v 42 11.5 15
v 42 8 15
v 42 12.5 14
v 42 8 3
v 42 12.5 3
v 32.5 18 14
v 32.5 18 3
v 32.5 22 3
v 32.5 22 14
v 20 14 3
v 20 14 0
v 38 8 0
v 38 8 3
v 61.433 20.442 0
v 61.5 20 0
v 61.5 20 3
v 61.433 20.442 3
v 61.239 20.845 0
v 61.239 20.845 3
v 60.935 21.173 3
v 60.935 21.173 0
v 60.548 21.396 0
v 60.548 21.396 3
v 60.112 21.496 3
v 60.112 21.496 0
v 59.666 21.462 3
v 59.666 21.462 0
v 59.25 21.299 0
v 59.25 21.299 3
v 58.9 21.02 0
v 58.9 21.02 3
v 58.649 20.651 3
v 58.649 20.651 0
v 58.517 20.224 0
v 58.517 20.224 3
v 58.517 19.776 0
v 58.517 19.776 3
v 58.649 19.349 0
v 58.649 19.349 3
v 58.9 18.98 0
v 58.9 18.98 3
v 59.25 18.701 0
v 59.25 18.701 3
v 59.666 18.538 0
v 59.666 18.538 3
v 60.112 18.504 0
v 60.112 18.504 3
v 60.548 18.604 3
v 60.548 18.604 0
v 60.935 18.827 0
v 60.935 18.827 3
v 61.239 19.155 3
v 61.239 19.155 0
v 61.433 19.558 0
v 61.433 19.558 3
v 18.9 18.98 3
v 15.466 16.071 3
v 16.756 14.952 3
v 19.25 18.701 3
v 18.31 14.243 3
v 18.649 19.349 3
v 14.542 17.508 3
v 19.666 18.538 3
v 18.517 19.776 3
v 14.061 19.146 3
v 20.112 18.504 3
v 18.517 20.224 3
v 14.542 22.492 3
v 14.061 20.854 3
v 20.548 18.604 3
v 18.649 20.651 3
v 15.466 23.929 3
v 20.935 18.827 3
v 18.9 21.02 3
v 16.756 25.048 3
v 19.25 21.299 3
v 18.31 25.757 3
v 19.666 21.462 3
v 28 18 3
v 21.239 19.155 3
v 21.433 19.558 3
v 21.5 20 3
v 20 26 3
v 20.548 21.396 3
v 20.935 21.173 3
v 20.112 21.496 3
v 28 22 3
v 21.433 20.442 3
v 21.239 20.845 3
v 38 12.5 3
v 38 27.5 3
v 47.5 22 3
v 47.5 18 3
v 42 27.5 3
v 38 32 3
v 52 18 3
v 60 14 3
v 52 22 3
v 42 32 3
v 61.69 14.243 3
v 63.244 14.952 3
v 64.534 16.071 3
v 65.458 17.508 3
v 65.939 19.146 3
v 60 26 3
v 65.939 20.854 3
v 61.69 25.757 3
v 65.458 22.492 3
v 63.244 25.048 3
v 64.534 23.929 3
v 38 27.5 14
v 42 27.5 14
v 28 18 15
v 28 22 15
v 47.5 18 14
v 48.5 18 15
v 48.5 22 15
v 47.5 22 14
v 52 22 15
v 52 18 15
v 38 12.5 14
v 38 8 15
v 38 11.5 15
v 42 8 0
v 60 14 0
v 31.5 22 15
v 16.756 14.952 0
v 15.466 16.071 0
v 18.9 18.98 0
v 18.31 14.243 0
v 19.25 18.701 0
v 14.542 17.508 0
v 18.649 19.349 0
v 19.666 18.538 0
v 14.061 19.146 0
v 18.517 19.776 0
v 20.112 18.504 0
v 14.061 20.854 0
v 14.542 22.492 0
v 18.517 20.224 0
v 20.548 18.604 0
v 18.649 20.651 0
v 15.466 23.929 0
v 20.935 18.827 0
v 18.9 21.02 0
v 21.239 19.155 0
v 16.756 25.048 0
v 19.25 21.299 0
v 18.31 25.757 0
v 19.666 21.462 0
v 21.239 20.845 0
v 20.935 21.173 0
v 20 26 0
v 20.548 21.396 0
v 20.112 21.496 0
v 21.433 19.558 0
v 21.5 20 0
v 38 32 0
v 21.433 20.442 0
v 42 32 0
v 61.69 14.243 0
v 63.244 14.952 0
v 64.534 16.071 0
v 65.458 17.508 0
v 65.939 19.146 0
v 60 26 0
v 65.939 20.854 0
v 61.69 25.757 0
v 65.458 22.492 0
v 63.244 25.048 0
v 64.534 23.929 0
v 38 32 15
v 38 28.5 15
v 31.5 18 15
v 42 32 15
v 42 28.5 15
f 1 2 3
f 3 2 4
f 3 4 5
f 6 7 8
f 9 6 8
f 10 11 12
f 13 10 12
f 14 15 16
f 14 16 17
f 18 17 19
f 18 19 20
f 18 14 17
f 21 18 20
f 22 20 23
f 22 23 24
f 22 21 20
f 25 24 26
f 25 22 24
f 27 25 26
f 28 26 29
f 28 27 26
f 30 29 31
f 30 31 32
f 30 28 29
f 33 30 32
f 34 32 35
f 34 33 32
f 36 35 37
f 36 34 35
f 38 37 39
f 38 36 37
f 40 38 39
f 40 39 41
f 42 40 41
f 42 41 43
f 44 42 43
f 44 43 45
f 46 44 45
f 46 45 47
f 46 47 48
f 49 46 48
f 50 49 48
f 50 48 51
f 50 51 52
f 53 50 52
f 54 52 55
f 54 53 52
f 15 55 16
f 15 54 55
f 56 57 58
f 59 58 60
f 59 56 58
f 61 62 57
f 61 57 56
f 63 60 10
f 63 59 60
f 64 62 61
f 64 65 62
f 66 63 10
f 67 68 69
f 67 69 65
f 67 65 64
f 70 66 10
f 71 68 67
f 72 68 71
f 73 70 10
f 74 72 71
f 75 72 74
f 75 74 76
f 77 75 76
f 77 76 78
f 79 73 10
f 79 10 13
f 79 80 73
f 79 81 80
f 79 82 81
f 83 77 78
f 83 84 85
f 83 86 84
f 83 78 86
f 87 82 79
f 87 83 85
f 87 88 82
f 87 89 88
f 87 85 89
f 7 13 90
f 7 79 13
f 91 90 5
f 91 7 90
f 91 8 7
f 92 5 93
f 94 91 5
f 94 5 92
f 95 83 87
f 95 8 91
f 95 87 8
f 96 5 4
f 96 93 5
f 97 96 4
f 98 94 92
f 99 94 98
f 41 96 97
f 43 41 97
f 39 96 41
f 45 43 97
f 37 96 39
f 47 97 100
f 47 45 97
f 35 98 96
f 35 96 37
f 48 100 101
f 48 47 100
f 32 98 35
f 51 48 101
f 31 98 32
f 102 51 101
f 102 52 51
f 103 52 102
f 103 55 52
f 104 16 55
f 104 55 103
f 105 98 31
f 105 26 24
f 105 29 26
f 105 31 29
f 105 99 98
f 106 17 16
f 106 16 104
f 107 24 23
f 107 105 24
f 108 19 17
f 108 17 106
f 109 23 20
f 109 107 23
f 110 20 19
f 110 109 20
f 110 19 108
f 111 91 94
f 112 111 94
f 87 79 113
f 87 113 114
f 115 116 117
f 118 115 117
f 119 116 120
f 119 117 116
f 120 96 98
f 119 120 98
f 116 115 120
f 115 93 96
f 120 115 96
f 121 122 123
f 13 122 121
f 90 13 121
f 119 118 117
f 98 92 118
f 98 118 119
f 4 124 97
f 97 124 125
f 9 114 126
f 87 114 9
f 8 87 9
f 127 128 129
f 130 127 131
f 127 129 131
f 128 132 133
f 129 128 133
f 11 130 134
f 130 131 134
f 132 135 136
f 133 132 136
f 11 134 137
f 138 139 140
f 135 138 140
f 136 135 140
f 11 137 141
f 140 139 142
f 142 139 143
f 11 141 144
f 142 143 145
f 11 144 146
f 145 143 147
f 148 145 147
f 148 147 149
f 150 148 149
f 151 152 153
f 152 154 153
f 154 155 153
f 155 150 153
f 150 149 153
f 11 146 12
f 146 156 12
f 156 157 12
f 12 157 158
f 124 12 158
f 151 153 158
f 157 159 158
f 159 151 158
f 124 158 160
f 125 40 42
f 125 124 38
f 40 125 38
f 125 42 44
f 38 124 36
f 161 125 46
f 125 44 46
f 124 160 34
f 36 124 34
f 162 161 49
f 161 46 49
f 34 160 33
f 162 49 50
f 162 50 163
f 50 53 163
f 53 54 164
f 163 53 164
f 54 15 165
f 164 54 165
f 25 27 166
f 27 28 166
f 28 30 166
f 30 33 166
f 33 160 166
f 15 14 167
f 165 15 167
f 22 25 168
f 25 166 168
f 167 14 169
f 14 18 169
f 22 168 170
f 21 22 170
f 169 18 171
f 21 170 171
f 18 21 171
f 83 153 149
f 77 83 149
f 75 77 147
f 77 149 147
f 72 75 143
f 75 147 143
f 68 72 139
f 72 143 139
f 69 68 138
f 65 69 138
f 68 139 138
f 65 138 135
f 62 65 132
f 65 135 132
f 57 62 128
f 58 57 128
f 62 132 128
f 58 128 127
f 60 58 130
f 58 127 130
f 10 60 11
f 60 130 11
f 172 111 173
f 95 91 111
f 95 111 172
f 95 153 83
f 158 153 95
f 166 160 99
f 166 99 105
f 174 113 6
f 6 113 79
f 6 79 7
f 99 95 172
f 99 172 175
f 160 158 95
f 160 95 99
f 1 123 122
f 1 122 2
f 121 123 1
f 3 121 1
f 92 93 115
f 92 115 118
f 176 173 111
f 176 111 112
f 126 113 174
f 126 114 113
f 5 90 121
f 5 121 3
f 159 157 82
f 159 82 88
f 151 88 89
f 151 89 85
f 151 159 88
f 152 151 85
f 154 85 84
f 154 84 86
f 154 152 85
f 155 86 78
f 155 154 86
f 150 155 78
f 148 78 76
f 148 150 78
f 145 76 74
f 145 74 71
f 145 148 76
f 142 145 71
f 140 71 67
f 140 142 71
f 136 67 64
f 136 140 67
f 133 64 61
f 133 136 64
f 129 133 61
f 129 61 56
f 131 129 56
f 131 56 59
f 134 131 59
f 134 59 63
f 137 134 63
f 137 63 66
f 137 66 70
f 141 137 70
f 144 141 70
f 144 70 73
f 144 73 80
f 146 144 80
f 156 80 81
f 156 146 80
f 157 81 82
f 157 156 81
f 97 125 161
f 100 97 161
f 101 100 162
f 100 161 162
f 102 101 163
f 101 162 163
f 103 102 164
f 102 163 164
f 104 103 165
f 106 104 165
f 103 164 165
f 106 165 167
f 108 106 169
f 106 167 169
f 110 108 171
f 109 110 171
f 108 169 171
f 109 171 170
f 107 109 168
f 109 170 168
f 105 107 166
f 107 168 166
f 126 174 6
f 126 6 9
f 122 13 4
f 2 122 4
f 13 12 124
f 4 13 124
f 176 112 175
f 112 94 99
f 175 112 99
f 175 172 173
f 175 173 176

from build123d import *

# Parameters (mm, degrees)
SKETCH_R      = 1.5
PAD_DEPTH     = 3
SKETCH001_W   = 4
SKETCH001_H   = 4.5
SKETCH001_W_2 = 4.5
SKETCH001_H_2 = 4
PAD001_DEPTH  = 12
CHAMFER_SIZE  = 1


with BuildPart() as part:
    # Sketch → Pad (new body)
    with BuildSketch(Plane.XY):
        with BuildLine():
            ThreePointArc((20, 26), (14, 20), (20, 14))
            Line((20, 14), (38, 8))
            Line((38, 8), (42, 8))
            Line((42, 8), (60, 14))
            ThreePointArc((60, 14), (66, 20), (60, 26))
            Line((42, 32), (60, 26))
            Line((38, 32), (42, 32))
            Line((20, 26), (38, 32))
        make_face()
        with Locations((20, 20)):
            Circle(SKETCH_R, mode=Mode.SUBTRACT)
        with Locations((60, 20)):
            Circle(SKETCH_R, mode=Mode.SUBTRACT)
    extrude(amount=PAD_DEPTH)

    # Sketch001 (on Face12 of Pad) → Pad001 (join)
    with BuildSketch(Plane.XY.offset(3)):
        with Locations((40, 29.75)):
            Rectangle(SKETCH001_W, SKETCH001_H)
        with Locations((40, 10.25)):
            Rectangle(SKETCH001_W, SKETCH001_H)
        with Locations((30.25, 20)):
            Rectangle(SKETCH001_W_2, SKETCH001_H_2)
        with Locations((49.75, 20)):
            Rectangle(SKETCH001_W_2, SKETCH001_H_2)
    extrude(amount=PAD001_DEPTH)

    # Chamfer
    chamfer_edges = [part.edges().sort_by_distance(p)[0] for p in [
        (32.5, 20, 15),
        (40, 12.5, 15),
        (40, 27.5, 15),
        (47.5, 20, 15),
    ]]
    chamfer(chamfer_edges, length=CHAMFER_SIZE)


solid = part.part
